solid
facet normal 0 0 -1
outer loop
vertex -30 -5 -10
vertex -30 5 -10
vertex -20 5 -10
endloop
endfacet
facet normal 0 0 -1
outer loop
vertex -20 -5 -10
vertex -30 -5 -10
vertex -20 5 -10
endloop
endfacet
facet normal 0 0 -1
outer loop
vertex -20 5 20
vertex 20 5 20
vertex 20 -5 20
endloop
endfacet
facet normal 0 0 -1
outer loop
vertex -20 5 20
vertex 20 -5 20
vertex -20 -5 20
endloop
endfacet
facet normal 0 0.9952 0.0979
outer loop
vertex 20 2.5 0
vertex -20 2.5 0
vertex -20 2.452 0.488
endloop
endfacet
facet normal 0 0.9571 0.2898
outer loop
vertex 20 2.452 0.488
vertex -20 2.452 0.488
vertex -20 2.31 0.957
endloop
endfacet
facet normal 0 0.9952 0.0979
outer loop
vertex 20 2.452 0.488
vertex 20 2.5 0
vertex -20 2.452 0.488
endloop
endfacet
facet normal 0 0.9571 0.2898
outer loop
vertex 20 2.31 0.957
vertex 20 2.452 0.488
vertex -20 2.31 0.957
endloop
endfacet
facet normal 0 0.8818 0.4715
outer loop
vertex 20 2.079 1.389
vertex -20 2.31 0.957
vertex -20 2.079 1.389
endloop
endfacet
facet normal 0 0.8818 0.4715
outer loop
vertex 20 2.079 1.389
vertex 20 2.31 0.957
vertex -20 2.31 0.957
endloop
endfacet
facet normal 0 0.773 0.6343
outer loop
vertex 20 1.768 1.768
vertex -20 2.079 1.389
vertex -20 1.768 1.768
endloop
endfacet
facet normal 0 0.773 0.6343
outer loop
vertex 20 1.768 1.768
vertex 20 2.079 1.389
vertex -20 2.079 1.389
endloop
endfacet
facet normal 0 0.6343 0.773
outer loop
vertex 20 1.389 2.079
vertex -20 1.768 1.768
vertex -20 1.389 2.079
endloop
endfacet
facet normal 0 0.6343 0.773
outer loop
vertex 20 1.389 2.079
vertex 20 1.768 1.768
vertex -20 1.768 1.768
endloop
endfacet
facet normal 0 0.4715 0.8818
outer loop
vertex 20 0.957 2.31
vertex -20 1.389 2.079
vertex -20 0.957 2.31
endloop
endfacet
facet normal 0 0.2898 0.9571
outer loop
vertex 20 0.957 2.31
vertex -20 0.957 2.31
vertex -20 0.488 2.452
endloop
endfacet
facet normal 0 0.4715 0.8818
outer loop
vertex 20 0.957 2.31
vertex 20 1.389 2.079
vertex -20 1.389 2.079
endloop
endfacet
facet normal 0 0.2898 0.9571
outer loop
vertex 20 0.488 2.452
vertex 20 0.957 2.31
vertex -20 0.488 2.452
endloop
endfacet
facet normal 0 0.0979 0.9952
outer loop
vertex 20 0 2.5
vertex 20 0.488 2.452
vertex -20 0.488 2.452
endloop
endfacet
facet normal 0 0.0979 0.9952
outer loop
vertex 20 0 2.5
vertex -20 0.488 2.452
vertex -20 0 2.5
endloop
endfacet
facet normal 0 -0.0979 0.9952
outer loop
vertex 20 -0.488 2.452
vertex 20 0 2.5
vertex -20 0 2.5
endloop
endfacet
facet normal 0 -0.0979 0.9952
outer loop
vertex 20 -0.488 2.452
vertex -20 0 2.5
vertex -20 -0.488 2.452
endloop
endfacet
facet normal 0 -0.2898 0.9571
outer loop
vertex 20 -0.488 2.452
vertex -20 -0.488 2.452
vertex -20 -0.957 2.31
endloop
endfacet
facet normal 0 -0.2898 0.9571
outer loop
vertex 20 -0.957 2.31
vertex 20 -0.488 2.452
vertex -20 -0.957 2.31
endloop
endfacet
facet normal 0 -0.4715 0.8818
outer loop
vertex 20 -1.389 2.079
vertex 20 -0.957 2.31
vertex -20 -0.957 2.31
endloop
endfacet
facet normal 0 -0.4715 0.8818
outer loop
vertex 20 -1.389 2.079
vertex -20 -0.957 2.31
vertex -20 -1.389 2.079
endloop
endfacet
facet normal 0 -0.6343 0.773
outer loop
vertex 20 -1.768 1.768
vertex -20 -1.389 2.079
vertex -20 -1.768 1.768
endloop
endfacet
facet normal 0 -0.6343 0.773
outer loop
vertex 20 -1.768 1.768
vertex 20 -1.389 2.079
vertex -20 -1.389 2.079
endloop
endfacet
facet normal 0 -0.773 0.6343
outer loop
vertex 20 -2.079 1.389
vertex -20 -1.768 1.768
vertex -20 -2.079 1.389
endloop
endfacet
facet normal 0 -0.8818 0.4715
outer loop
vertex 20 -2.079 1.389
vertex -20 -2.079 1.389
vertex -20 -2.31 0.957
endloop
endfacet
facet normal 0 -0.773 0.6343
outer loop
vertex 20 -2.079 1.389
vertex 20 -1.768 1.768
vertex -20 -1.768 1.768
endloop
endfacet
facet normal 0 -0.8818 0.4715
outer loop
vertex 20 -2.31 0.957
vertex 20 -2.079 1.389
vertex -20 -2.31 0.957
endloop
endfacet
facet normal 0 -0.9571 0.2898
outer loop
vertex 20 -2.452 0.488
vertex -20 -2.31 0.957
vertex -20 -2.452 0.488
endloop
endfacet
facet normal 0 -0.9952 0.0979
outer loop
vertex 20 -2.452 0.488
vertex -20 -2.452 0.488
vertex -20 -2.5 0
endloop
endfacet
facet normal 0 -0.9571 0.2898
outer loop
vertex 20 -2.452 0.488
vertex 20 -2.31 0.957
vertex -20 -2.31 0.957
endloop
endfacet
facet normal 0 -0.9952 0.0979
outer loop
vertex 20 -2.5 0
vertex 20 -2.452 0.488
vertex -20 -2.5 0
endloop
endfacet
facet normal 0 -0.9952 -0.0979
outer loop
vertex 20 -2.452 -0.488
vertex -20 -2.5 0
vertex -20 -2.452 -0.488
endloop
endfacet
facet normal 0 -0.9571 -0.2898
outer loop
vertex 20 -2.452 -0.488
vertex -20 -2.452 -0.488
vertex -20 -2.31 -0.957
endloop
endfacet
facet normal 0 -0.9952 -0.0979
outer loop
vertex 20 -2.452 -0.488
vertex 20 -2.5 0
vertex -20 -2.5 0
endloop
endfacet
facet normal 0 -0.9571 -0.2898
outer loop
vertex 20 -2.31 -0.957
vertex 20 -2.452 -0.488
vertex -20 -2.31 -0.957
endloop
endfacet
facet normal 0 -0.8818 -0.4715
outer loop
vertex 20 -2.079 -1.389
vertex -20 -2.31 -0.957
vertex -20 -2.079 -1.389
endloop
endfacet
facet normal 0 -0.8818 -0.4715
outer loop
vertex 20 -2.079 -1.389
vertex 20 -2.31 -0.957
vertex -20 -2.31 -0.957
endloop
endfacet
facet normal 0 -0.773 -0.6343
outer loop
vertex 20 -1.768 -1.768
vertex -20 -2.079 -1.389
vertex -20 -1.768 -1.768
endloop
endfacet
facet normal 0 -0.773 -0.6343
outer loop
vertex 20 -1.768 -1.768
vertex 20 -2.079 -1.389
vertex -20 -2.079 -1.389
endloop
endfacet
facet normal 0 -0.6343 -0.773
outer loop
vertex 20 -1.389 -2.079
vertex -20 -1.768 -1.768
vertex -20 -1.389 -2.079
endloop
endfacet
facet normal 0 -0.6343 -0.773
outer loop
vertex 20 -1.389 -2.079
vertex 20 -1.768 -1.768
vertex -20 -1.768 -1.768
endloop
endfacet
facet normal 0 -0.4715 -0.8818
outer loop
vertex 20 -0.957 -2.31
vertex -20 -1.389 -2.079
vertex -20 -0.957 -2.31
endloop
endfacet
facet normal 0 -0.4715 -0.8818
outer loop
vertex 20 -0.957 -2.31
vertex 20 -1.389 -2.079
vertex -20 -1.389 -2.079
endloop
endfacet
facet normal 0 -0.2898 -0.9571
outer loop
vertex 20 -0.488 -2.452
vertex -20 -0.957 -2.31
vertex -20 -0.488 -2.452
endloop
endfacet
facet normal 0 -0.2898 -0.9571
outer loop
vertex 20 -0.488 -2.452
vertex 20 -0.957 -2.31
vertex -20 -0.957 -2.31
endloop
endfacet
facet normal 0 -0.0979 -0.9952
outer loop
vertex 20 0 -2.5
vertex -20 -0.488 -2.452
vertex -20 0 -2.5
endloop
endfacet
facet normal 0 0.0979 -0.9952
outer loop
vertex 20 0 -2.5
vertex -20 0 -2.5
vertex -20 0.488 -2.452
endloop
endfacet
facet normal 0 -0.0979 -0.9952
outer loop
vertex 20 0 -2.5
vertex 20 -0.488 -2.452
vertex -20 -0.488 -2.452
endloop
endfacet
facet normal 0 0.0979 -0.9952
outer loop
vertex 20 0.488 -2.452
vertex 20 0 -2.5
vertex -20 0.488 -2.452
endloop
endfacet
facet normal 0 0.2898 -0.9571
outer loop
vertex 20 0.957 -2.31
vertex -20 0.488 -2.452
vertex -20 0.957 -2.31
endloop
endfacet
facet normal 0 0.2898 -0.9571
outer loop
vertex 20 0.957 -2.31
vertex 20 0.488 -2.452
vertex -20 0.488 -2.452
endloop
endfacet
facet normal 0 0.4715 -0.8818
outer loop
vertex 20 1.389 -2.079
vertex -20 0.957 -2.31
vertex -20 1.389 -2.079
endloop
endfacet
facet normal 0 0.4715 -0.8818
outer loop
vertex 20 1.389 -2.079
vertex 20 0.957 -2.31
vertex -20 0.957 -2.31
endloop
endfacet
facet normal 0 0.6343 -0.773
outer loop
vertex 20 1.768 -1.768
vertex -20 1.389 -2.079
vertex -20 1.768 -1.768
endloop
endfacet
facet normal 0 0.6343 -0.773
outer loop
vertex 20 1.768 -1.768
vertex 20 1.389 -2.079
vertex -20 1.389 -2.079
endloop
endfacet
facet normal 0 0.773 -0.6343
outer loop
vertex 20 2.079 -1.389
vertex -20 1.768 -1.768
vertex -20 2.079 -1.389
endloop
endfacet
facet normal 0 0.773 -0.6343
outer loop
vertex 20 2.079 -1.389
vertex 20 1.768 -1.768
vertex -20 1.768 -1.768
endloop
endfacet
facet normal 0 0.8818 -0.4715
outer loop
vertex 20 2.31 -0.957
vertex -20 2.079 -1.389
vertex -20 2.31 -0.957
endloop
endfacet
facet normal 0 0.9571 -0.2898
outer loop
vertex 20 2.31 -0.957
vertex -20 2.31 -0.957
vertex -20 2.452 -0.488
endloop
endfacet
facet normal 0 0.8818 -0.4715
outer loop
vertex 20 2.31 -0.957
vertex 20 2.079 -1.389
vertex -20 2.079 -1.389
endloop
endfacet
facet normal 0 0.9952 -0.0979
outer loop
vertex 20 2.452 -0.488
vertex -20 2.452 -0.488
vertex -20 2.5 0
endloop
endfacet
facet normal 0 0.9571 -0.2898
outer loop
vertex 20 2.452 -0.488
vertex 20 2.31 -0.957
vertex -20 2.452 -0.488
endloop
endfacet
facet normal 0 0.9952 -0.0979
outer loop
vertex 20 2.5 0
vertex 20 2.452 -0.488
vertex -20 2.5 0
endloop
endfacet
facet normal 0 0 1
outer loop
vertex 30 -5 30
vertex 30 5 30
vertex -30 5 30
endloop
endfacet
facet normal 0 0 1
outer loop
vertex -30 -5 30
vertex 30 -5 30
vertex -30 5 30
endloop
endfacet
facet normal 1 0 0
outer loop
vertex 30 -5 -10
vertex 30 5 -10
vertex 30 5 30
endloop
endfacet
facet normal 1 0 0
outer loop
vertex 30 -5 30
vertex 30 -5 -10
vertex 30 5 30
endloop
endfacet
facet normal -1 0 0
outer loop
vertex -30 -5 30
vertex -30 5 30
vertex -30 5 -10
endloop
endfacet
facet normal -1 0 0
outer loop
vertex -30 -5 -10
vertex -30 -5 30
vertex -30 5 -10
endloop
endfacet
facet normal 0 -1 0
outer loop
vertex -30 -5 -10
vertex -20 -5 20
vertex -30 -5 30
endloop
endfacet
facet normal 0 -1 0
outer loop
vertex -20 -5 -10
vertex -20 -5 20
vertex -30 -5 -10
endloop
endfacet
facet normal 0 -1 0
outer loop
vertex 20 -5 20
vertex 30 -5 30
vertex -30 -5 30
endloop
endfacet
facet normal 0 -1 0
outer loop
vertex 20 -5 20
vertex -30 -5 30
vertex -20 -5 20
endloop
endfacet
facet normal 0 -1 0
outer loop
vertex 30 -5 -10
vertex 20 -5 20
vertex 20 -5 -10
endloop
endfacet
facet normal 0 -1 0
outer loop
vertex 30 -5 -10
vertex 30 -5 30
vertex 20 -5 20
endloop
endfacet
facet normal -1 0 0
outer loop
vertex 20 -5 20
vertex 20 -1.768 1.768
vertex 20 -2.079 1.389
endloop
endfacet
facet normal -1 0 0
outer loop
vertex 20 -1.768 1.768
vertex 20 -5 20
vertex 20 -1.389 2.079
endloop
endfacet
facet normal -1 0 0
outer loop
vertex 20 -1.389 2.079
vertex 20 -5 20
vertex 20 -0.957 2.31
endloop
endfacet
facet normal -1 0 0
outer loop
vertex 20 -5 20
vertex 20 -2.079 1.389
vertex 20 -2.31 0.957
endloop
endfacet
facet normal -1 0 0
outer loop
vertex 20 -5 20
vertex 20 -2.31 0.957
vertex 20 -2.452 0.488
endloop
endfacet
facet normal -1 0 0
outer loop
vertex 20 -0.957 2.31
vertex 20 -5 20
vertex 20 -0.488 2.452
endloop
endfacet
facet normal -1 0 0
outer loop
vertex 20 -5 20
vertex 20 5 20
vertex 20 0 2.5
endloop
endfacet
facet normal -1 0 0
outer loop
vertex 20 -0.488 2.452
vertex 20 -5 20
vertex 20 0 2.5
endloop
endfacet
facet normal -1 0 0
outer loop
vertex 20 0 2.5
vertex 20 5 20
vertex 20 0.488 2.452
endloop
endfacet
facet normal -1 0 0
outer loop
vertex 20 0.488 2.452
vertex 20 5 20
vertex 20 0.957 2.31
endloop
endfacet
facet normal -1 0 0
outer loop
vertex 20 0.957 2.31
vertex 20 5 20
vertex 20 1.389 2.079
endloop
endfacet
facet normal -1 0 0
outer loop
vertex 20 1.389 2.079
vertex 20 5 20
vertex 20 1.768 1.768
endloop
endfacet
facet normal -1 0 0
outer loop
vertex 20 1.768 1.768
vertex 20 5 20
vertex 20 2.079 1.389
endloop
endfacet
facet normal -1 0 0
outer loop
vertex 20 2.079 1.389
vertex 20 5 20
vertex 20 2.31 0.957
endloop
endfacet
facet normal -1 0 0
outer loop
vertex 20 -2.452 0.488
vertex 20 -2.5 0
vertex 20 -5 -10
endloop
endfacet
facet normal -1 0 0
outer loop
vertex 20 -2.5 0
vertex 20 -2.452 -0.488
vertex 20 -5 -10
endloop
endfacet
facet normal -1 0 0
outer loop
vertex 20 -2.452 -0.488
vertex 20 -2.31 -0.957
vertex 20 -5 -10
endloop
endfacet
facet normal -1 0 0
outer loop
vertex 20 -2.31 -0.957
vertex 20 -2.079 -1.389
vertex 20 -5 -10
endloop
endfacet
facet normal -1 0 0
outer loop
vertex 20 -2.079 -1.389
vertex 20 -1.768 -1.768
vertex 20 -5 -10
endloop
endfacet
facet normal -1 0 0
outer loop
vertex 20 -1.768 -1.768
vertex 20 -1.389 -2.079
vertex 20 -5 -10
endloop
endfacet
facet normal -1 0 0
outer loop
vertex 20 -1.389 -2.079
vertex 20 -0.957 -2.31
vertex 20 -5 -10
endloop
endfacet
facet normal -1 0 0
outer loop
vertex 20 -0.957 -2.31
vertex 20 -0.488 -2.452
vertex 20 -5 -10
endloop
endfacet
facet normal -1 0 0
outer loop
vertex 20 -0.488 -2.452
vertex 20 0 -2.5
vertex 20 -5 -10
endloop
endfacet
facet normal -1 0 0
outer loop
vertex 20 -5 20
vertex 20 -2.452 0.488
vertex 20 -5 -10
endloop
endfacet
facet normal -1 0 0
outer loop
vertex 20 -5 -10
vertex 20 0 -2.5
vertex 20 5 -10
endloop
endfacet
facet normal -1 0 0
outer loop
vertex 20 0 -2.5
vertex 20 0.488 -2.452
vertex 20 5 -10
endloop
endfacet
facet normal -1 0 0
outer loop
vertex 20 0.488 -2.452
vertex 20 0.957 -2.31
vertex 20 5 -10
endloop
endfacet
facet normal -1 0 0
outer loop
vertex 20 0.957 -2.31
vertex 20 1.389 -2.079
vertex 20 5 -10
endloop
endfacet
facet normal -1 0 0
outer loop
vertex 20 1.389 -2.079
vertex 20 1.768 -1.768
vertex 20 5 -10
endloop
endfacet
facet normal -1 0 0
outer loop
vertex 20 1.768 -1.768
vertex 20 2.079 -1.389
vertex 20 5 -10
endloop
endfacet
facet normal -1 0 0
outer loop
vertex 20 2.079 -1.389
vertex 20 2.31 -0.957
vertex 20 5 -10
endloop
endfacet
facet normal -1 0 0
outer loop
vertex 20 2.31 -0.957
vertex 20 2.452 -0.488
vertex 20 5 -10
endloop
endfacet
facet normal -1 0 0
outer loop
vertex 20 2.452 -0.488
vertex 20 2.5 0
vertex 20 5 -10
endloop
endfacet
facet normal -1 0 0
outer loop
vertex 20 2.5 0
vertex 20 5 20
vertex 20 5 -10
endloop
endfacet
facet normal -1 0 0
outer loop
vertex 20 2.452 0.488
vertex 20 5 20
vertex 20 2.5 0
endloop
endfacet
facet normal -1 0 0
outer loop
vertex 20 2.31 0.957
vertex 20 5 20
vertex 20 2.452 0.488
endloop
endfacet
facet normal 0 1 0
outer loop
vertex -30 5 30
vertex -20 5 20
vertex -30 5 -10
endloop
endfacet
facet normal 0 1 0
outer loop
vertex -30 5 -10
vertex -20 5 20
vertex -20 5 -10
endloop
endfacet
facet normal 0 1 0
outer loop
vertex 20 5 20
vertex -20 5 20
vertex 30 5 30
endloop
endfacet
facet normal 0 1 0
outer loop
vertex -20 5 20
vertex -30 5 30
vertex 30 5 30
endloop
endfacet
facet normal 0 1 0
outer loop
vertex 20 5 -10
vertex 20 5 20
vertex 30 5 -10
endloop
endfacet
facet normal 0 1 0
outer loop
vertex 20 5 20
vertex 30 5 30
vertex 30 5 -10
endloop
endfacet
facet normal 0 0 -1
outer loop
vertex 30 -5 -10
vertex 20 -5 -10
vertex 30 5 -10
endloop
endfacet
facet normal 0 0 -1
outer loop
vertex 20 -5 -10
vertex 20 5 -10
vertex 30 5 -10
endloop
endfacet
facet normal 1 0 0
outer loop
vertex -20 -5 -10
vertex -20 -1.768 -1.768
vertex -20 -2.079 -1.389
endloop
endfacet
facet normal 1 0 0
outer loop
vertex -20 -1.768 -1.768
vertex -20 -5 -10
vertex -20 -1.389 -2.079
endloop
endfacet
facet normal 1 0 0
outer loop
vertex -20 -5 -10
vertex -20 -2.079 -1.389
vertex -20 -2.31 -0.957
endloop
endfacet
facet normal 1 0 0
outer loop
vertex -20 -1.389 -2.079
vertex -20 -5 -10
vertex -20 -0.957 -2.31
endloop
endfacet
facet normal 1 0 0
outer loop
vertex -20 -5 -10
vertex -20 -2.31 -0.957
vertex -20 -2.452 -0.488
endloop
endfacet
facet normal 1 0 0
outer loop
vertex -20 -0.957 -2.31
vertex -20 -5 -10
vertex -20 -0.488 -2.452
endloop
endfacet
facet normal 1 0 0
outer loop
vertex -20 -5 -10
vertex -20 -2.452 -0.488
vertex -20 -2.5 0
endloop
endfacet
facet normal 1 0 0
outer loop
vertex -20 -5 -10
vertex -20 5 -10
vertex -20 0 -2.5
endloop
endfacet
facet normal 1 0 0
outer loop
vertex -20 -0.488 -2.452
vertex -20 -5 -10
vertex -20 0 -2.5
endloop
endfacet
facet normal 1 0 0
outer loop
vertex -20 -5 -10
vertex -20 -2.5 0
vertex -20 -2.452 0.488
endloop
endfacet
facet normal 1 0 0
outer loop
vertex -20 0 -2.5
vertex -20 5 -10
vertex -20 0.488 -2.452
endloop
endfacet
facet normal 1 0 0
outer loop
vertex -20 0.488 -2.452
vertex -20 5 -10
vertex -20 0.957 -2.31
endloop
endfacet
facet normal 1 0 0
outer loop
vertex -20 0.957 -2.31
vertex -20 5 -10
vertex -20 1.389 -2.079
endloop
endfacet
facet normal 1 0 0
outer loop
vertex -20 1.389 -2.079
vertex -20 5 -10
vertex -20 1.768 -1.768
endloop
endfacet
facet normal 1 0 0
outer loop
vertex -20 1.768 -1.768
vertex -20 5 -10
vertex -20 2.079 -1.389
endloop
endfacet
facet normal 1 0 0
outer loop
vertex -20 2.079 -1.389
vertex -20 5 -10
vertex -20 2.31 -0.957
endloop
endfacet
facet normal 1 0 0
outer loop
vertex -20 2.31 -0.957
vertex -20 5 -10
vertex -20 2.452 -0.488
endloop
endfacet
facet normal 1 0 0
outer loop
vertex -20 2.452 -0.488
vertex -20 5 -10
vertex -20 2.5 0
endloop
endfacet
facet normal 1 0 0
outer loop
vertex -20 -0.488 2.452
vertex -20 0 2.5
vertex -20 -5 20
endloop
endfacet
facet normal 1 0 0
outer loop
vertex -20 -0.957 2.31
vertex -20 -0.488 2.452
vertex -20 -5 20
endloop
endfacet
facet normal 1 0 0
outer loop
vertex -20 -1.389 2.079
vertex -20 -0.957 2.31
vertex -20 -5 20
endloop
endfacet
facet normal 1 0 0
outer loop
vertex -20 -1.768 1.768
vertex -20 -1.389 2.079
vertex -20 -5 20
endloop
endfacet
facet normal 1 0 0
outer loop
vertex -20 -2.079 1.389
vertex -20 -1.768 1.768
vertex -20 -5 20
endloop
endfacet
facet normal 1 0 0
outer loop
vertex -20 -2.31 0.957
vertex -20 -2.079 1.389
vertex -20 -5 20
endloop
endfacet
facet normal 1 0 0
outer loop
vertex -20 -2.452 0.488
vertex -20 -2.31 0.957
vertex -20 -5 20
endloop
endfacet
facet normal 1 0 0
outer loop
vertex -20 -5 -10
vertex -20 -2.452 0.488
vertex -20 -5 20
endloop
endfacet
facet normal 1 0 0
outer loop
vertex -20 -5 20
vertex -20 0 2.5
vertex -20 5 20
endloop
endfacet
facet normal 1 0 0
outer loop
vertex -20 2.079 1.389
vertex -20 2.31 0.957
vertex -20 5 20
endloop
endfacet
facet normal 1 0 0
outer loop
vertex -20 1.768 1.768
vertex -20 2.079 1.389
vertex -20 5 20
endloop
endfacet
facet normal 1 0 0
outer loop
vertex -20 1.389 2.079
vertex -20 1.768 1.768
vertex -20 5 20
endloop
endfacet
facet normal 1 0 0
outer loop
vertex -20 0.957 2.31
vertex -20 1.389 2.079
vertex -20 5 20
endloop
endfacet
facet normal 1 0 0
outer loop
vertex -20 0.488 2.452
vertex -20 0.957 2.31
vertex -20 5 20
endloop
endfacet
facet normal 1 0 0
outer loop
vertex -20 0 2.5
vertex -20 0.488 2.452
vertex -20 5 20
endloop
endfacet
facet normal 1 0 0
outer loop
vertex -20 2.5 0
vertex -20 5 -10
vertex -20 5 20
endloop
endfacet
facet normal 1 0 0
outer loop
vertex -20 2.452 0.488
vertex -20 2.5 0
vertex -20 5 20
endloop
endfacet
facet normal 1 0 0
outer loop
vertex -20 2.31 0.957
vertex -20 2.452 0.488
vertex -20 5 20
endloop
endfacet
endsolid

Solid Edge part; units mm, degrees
sketch "Sketch1" plane through (0, 0, 0) normal (1, 0, 0) x (0, 1, 0)
  circle A0 centre (0, 0) radius 2.5
extrude "Protrusion1" add sketch "Sketch1" along normal mid plane 40
sketch "Sketch2" plane through (0, 0, 0) normal (0, -1, 0) x (1, 0, 0)
  line L0 (30, 0) -> (30, 20)
  line L1 (30, -10) -> (30, 0)
  line L2 (20, -10) -> (30, -10)
  line L3 (20, 20) -> (20, -10)
  line L4 (20, 20) -> (-20, 20)
  line L5 (-20, -10) -> (-20, 20)
  line L6 (-30, -10) -> (-20, -10)
  line L7 (-30, 0) -> (-30, -10)
  line L8 (-30, 20) -> (-30, 0)
  line L9 (-30, 30) -> (-30, 20)
  line L10 (30, 30) -> (-30, 30)
  line L11 (30, 20) -> (30, 30)
extrude "ExtrudedProtrusion_2" add sketch "Sketch2" along normal mid plane 10
